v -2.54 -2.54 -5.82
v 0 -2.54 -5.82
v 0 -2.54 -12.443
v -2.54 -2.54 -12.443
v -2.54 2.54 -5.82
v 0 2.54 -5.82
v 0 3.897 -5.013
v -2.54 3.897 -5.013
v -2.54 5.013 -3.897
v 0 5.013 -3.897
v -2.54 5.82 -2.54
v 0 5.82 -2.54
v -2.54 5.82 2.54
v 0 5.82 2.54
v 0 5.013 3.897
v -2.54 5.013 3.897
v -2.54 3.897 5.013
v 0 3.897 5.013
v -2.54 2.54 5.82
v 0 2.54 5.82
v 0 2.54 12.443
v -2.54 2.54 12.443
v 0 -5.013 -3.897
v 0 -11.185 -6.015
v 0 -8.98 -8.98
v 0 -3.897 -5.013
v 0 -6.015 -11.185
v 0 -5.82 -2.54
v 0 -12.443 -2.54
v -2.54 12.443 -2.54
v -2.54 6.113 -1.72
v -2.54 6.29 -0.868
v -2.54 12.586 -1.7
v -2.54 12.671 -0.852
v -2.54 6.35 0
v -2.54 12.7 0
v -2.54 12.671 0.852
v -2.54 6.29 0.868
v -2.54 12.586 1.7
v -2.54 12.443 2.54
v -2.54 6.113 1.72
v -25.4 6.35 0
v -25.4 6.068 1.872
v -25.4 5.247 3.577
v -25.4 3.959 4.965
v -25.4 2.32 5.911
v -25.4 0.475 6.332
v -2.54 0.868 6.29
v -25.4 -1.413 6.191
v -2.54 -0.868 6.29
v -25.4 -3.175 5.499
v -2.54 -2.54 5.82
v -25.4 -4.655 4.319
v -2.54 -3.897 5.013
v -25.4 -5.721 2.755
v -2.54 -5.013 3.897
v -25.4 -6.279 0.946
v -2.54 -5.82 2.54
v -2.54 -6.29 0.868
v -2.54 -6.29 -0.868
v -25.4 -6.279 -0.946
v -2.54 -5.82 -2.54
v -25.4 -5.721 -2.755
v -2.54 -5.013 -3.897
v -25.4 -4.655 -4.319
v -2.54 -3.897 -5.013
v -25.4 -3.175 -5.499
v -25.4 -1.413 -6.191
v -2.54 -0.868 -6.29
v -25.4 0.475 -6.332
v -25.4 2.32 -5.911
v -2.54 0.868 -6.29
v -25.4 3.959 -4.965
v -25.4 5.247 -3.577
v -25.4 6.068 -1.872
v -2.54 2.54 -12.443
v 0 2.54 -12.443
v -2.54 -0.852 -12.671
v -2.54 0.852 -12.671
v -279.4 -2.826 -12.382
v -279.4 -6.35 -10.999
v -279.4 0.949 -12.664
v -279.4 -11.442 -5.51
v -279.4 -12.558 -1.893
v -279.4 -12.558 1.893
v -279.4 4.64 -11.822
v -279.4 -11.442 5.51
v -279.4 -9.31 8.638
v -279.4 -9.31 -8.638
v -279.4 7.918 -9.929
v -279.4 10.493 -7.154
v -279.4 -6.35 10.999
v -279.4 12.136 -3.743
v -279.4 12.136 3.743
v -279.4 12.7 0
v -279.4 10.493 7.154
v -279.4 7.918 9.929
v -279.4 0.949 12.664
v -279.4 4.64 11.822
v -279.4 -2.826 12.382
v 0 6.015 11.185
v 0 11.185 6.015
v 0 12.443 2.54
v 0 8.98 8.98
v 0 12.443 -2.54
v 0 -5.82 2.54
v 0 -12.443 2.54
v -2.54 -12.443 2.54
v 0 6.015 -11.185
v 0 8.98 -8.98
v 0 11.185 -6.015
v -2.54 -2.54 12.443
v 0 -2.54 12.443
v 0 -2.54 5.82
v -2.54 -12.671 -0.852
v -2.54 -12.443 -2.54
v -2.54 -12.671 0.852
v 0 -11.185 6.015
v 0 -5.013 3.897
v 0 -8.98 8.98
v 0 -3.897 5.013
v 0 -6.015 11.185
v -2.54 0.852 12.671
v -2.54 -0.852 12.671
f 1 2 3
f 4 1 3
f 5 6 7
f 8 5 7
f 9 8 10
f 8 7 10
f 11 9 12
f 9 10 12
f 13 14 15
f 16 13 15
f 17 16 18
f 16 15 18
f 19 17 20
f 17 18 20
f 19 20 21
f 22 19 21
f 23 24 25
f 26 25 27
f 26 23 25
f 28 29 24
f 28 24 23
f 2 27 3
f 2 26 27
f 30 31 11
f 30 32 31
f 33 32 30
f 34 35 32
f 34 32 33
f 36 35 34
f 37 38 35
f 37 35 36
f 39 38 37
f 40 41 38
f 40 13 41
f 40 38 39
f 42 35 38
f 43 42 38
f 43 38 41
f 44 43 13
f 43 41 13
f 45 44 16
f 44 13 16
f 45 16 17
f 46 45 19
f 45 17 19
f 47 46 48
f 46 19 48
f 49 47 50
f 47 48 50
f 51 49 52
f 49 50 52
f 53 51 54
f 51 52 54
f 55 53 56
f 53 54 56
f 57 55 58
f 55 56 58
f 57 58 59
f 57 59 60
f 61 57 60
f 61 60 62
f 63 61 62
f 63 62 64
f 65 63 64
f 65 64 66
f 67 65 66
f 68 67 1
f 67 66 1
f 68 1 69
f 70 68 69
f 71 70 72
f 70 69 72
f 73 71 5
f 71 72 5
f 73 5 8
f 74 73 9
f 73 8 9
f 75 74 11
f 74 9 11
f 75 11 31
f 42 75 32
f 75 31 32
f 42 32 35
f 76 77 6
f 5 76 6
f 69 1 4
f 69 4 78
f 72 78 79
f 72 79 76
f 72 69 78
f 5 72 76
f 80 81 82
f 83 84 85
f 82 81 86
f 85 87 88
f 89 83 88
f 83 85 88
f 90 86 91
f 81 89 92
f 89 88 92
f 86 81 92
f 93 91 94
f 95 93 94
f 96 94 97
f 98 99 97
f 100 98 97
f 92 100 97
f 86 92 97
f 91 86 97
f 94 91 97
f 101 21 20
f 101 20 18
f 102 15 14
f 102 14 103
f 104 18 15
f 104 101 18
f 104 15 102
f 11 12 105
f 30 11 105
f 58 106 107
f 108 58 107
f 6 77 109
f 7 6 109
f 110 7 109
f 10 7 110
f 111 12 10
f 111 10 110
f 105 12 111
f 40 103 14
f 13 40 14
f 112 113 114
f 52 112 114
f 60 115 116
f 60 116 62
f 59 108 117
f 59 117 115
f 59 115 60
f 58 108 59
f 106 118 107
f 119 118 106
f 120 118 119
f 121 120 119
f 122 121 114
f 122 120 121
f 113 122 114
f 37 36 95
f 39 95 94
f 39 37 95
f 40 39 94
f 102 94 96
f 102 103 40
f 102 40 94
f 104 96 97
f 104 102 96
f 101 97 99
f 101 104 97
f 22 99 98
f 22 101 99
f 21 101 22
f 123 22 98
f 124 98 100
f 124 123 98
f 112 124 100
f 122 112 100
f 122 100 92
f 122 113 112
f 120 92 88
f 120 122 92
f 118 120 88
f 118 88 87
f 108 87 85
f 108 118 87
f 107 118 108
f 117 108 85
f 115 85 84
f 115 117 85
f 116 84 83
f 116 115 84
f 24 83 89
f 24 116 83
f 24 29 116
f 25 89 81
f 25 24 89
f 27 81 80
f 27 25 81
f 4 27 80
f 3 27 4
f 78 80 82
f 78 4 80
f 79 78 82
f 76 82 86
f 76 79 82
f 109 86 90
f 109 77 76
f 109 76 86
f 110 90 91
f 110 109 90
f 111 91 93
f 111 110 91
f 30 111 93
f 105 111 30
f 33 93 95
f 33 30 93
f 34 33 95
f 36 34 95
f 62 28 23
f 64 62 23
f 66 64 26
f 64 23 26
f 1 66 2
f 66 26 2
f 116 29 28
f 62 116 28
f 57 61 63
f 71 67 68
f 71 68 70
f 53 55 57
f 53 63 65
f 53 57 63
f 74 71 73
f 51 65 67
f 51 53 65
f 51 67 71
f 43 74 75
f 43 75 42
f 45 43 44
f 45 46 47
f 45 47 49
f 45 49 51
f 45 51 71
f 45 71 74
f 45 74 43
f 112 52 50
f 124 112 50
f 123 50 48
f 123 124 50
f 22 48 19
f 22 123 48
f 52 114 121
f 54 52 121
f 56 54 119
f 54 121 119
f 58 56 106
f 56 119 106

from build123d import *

# Parameters (mm, degrees)
F0_R     = 12.7
F1_DEPTH = 279.4
F2_R     = 6.35
F3_DEPTH = 25.4
F5_DEPTH = 2.54


with BuildPart() as f1:
    # F0 (on Right) → F1 (new body)
    with BuildSketch(Plane.YZ):
        Circle(F0_R)
    extrude(amount=-F1_DEPTH)

    # F2 (on face) → F3 (cut)
    with BuildSketch(Plane.YZ):
        Circle(F2_R)
    extrude(amount=-F3_DEPTH, mode=Mode.SUBTRACT)

    # F4 (on Right) → F5 (cut)
    with BuildSketch(Plane.YZ):
        with BuildLine():
            ThreePointArc((2.54, -5.819871), (0, -6.35), (-2.54, -5.819871))
            Line((-2.54, -5.819871), (-2.54, -12.443408))
            ThreePointArc((-2.54, -12.443408), (0, -12.7), (2.54, -12.443408))
            Line((2.54, -12.443408), (2.54, -5.819871))
        make_face()
        with BuildLine():
            ThreePointArc((-5.819871, -2.54), (-6.35, 0), (-5.819871, 2.54))
            Line((-5.819871, 2.54), (-12.443408, 2.54))
            ThreePointArc((-12.443408, 2.54), (-12.7, 0), (-12.443408, -2.54))
            Line((-12.443408, -2.54), (-5.819871, -2.54))
        make_face()
        with BuildLine():
            ThreePointArc((2.54, 12.443408), (0, 12.7), (-2.54, 12.443408))
            Line((-2.54, 12.443408), (-2.54, 5.819871))
            ThreePointArc((-2.54, 5.819871), (-4.490128, 4.490128), (-5.819871, 2.54))
            ThreePointArc((-5.819871, 2.54), (-6.35, 0), (-5.819871, -2.54))
            ThreePointArc((-5.819871, -2.54), (-4.490128, -4.490128), (-2.54, -5.819871))
            ThreePointArc((-2.54, -5.819871), (0, -6.35), (2.54, -5.819871))
            ThreePointArc((2.54, -5.819871), (4.490128, -4.490128), (5.819871, -2.54))
            ThreePointArc((5.819871, -2.54), (6.35, 0), (5.819871, 2.54))
            ThreePointArc((5.819871, 2.54), (4.490128, 4.490128), (2.54, 5.819871))
            Line((2.54, 5.819871), (2.54, 12.443408))
        make_face()
        with BuildLine():
            Line((12.443408, 2.54), (5.819871, 2.54))
            ThreePointArc((5.819871, 2.54), (6.35, 0), (5.819871, -2.54))
            Line((5.819871, -2.54), (12.443408, -2.54))
            ThreePointArc((12.443408, -2.54), (12.7, 0), (12.443408, 2.54))
        make_face()
    extrude(amount=-F5_DEPTH, mode=Mode.SUBTRACT)


solid = f1.part
